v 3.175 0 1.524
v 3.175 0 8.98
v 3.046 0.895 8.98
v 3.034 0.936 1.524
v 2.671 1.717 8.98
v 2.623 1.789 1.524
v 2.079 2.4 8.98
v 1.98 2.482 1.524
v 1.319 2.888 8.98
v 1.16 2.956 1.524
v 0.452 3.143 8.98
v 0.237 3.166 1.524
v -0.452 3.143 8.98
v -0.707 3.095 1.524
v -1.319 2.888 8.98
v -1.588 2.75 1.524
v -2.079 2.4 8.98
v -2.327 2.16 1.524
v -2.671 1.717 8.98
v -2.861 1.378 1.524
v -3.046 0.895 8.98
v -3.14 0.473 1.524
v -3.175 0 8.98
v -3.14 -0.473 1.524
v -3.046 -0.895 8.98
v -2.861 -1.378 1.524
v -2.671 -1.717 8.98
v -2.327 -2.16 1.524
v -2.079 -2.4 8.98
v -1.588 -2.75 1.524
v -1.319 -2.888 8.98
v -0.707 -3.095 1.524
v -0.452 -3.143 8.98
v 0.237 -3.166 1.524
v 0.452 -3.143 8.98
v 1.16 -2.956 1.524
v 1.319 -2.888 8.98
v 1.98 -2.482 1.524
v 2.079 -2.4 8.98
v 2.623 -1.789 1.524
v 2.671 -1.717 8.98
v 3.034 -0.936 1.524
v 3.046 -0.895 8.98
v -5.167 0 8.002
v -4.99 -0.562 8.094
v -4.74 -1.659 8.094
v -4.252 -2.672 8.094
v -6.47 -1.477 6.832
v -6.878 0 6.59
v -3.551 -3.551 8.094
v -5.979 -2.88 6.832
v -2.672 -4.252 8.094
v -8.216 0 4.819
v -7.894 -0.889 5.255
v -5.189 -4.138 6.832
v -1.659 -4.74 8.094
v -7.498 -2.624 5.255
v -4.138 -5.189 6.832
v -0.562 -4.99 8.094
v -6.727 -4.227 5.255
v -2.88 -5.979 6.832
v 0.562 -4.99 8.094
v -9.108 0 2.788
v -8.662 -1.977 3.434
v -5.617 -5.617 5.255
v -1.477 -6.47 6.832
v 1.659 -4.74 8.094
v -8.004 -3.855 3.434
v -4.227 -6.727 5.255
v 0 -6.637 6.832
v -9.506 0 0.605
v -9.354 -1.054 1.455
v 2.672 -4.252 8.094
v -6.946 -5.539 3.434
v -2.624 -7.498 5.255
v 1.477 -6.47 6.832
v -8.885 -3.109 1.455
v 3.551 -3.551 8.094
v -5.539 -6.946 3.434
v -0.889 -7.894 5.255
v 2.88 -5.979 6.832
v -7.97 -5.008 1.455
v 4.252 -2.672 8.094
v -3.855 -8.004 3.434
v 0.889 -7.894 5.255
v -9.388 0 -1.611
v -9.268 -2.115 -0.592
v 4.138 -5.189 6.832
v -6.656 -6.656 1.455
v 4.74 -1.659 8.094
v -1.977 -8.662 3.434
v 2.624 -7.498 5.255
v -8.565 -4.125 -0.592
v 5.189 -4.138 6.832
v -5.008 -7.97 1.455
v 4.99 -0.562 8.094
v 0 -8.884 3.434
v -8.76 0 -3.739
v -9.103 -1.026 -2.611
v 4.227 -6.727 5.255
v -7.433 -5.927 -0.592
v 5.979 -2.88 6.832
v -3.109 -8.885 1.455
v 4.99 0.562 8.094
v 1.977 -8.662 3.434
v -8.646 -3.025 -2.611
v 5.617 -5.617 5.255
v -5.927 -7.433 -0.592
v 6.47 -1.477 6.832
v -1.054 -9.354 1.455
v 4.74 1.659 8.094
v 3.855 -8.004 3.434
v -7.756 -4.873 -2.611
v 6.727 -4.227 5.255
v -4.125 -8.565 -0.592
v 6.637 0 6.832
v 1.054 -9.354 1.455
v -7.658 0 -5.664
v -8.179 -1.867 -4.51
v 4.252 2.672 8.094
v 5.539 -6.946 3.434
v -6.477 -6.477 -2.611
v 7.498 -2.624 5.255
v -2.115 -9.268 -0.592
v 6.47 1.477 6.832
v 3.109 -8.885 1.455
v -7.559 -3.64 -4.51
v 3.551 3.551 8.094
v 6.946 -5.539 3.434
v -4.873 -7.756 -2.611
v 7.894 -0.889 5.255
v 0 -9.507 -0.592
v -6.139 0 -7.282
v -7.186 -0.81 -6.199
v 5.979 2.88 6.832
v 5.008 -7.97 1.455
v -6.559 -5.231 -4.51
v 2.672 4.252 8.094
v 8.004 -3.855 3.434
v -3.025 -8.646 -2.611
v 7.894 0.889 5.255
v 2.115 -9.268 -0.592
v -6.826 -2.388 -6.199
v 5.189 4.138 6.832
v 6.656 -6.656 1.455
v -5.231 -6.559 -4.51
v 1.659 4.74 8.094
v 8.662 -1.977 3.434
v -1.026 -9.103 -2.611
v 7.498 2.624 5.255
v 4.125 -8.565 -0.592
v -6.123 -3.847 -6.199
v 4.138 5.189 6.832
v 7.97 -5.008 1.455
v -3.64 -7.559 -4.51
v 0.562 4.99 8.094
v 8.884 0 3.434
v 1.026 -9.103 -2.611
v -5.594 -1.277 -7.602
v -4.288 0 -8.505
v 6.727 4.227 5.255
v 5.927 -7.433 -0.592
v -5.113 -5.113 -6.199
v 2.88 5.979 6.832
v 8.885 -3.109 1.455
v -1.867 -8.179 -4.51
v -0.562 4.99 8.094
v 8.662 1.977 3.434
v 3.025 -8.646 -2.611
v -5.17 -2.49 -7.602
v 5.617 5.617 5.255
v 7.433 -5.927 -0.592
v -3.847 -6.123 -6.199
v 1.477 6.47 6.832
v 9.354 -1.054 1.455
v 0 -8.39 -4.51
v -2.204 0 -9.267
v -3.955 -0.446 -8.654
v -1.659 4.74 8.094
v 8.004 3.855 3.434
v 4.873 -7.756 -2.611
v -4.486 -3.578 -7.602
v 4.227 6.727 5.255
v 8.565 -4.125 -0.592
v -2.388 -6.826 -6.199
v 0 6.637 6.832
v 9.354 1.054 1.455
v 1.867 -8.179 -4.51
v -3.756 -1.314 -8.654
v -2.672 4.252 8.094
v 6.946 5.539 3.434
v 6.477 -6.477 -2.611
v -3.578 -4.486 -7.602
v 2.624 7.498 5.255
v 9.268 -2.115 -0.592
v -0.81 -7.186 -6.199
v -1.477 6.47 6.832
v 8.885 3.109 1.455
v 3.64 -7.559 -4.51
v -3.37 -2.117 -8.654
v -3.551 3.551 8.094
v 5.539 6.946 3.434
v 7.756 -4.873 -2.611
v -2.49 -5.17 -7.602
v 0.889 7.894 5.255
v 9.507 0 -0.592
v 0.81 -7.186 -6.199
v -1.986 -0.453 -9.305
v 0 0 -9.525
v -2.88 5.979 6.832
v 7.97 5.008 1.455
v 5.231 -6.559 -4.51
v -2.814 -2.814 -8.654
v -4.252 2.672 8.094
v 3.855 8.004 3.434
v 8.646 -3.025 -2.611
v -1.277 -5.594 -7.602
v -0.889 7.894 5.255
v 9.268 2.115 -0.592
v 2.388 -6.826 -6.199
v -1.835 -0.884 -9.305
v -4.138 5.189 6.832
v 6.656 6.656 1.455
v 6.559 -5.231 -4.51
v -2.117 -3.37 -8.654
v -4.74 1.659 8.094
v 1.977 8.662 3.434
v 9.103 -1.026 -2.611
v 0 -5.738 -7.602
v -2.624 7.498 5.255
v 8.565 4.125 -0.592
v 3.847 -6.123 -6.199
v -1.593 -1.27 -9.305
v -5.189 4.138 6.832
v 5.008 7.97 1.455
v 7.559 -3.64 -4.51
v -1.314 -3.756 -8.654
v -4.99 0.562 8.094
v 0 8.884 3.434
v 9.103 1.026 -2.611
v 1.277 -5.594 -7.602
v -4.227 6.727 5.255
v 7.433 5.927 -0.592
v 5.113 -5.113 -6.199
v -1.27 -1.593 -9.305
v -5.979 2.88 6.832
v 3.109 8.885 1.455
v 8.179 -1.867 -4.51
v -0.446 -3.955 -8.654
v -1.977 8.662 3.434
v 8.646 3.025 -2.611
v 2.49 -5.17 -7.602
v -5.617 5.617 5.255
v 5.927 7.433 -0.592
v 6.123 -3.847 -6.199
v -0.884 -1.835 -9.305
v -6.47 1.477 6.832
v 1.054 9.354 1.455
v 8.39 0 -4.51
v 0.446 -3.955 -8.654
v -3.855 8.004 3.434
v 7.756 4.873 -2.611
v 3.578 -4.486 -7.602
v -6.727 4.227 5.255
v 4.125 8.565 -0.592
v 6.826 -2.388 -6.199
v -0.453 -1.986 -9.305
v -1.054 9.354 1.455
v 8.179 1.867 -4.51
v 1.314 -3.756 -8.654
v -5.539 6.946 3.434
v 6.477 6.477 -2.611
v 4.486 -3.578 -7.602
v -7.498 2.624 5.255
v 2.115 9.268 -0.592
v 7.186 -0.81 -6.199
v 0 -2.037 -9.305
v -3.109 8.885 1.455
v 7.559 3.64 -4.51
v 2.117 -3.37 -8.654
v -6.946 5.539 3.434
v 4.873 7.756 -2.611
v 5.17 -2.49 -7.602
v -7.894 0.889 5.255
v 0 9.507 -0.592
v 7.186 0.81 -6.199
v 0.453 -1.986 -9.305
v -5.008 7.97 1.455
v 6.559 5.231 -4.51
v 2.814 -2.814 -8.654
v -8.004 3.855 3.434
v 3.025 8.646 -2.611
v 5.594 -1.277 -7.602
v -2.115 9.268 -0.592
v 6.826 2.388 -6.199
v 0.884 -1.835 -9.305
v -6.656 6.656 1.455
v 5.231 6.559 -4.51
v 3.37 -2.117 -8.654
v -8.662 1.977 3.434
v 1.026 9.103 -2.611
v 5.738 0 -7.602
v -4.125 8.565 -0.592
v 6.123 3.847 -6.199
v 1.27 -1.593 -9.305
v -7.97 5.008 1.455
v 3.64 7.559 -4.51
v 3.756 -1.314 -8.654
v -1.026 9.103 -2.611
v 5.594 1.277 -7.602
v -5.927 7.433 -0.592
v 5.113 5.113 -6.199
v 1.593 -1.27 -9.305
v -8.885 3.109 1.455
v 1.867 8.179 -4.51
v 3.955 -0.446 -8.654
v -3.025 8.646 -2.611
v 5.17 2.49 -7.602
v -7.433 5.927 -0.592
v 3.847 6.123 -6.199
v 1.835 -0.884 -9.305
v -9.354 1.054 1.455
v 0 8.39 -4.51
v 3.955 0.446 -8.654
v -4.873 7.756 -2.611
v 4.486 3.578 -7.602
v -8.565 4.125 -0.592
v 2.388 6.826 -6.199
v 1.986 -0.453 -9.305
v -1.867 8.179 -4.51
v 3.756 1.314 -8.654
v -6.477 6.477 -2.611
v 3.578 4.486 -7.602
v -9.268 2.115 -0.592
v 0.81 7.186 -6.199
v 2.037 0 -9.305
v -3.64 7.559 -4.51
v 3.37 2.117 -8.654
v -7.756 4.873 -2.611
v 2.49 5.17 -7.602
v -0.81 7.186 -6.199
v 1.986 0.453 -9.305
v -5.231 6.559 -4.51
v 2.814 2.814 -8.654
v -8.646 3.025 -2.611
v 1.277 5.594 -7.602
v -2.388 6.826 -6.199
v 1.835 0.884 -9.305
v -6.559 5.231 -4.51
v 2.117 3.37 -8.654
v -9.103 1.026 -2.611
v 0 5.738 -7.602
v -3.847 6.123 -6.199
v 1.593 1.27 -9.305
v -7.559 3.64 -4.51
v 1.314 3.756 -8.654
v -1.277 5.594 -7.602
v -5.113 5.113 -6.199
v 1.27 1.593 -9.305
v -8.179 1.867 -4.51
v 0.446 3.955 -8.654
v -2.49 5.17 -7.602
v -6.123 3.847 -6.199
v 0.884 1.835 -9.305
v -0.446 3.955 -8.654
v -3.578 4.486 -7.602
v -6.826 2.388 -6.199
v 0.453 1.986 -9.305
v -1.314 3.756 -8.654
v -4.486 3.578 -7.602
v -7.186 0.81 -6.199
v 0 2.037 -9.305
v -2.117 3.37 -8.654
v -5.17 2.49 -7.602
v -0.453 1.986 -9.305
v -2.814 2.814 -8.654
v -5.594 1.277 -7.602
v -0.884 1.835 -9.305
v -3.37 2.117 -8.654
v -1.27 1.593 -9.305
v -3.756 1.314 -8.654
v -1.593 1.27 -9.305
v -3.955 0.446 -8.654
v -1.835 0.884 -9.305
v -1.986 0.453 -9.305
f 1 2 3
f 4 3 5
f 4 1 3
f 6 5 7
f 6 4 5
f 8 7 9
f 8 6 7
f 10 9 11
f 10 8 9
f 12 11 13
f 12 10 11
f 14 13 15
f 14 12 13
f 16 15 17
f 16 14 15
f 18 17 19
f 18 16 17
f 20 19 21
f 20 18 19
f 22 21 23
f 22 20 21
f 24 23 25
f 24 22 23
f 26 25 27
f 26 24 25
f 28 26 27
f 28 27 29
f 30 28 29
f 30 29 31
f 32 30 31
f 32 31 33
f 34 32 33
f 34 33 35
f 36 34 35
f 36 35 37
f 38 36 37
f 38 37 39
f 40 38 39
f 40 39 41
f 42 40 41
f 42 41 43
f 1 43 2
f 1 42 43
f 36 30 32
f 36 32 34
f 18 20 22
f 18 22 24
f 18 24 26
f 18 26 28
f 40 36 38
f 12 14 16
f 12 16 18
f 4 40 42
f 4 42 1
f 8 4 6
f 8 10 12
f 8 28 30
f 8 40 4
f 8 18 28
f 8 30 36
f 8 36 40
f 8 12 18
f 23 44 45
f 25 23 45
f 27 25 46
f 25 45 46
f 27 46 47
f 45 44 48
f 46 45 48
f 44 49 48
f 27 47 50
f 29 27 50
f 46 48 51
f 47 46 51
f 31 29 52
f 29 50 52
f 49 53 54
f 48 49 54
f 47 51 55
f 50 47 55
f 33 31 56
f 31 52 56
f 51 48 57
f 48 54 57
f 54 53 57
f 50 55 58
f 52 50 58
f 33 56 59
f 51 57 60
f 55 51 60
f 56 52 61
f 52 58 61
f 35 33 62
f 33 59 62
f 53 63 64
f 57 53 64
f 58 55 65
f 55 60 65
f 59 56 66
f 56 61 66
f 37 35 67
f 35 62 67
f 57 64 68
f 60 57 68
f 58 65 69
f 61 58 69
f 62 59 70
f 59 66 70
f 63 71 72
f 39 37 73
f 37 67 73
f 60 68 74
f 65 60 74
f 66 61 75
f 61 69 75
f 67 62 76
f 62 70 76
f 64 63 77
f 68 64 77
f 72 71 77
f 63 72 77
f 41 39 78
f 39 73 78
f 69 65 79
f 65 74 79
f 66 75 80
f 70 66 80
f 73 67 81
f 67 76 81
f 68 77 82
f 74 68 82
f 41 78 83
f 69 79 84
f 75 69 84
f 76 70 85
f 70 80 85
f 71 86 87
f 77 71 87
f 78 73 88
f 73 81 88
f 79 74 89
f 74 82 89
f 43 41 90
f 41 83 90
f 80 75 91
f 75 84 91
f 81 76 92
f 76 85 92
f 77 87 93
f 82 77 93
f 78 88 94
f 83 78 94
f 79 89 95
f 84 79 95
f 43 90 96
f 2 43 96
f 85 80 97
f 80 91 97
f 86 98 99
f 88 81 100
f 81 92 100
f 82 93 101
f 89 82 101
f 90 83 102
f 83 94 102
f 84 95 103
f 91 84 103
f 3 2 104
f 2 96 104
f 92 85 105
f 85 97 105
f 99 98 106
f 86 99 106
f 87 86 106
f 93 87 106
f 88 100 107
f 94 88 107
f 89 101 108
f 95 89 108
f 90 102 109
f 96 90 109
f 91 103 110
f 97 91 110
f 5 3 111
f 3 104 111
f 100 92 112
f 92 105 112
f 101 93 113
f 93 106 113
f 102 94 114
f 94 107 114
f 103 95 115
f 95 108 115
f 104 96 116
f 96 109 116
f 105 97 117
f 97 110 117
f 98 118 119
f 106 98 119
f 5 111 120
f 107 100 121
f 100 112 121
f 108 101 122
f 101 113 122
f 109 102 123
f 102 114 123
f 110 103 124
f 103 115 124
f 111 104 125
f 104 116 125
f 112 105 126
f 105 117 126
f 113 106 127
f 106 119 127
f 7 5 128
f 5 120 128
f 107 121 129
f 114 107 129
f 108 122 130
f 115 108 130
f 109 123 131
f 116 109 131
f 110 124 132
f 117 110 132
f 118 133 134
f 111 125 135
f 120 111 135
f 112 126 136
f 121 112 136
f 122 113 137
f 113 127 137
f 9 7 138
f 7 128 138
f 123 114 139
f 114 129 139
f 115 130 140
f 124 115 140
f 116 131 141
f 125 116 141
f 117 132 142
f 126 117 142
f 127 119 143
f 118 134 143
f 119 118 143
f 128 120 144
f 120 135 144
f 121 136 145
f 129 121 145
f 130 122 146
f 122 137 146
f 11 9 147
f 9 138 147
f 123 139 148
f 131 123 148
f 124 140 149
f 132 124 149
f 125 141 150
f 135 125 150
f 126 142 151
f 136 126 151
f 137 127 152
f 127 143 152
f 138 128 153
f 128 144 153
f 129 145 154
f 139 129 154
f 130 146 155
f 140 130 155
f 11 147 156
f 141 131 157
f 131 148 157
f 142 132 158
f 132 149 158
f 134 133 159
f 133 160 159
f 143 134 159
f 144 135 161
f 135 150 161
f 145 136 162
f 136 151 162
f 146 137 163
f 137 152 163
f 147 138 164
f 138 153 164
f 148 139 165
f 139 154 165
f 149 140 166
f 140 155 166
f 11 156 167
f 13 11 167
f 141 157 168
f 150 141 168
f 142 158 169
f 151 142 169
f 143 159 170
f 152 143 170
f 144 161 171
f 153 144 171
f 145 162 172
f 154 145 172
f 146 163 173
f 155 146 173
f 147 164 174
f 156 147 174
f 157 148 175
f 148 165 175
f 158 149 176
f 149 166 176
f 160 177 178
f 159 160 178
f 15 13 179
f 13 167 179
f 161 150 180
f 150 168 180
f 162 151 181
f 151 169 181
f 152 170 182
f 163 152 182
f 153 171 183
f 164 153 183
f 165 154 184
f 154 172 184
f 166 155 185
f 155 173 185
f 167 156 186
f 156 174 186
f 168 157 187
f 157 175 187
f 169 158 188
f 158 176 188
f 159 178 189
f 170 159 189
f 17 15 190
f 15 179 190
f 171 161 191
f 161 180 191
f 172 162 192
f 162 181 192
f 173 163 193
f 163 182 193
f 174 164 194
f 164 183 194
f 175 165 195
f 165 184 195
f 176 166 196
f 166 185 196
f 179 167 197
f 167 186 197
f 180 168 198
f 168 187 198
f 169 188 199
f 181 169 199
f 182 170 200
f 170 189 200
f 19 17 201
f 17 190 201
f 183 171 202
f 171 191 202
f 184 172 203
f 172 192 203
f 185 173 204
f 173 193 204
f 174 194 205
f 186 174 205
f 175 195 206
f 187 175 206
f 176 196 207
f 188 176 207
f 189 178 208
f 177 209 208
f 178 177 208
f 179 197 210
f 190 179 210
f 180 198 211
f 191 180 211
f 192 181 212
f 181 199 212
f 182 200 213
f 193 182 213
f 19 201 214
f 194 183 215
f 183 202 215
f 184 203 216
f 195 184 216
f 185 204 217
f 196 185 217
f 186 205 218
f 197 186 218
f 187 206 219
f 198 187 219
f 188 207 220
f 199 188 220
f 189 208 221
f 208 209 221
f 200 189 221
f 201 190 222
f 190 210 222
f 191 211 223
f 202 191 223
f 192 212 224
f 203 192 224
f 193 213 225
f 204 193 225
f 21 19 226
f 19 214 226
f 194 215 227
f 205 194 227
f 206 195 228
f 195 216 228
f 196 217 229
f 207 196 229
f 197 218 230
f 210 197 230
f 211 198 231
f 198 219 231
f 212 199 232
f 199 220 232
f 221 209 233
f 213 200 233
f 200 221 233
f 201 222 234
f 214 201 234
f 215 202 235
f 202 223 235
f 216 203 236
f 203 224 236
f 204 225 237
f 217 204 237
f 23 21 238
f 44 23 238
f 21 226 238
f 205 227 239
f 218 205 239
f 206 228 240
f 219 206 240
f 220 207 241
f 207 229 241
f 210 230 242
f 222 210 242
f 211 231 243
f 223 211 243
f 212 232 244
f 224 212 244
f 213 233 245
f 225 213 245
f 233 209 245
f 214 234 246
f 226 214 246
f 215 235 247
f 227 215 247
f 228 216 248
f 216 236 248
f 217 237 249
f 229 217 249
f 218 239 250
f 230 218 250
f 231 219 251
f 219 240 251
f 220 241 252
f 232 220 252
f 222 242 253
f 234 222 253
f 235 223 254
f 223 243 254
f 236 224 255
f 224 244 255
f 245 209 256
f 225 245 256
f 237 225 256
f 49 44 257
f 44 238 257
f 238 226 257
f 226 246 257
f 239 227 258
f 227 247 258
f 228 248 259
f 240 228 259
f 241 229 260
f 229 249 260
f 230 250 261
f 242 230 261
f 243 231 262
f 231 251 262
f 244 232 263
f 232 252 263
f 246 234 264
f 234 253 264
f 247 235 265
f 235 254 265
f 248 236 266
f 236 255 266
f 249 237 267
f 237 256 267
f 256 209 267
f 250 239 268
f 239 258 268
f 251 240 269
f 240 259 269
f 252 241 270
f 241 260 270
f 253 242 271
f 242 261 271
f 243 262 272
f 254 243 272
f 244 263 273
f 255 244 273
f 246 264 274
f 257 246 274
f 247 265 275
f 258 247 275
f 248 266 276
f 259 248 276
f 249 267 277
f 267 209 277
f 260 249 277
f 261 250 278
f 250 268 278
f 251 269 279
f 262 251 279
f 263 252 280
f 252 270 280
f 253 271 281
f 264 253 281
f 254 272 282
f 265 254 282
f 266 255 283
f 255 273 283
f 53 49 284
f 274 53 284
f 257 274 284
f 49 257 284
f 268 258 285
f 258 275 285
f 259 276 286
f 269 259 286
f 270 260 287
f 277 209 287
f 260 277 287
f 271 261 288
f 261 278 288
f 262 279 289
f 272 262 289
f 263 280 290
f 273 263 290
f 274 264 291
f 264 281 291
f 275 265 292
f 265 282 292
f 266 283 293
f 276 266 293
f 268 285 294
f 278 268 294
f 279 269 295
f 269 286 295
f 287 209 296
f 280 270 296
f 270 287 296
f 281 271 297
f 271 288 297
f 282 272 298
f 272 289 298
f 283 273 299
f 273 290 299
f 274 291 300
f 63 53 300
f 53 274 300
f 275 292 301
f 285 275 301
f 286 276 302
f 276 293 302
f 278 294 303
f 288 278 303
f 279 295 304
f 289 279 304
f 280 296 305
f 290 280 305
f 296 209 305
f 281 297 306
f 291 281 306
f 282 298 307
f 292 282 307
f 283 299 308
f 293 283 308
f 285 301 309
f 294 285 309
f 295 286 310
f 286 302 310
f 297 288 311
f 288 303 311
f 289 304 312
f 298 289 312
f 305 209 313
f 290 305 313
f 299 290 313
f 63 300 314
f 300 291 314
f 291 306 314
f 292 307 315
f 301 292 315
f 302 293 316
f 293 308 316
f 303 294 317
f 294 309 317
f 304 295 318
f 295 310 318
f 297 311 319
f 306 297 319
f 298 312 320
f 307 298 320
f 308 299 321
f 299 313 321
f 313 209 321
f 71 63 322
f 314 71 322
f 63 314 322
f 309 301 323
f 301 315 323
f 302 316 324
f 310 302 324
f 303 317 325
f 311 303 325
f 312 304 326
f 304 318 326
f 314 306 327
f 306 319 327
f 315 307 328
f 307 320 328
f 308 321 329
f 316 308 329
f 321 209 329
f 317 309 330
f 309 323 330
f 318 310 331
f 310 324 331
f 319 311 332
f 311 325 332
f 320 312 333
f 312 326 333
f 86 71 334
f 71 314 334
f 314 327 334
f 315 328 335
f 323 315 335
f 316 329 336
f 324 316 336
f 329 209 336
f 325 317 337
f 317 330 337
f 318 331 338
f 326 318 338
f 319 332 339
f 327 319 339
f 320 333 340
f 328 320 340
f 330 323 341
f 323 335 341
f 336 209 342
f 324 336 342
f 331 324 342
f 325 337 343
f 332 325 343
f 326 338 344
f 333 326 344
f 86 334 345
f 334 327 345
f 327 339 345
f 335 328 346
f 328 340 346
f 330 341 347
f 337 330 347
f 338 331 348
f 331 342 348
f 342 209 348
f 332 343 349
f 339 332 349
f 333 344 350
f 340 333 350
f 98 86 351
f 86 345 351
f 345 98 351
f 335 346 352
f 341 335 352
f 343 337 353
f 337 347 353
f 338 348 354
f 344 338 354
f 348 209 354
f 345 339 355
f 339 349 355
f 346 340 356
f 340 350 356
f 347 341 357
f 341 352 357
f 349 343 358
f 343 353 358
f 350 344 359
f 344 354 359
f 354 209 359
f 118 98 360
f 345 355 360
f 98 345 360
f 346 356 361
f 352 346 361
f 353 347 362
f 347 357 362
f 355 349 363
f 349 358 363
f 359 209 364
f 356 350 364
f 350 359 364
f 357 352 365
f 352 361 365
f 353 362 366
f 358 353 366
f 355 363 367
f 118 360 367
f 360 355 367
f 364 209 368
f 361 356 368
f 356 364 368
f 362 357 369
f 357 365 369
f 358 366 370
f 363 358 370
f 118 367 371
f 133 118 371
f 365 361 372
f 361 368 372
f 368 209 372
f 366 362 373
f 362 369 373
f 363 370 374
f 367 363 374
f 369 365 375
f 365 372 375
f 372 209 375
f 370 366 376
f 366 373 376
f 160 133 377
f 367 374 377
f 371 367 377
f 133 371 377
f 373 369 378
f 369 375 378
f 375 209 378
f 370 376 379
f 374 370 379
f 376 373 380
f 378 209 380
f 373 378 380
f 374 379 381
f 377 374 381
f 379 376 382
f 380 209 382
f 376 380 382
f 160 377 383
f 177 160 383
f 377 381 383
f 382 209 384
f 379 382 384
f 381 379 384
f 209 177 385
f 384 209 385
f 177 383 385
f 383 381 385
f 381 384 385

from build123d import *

# Parameters (mm, degrees)
F4_R     = 3.175
F5_DEPTH = 10.668
F6_DEPTH = 6.858


with BuildPart() as f2:
    # F0 (on Front) → F2 (revolve)
    with BuildSketch(Plane.XZ):
        with BuildLine():
            Line((0, -9.525), (0, 9.525))
            ThreePointArc((0, 9.525), (-9.525, 0), (0, -9.525))
        make_face()
    revolve(axis=Axis((0, 0, 0), (0, 0, 1)))

    # F4 (on offset) → F5 (cut)
    with BuildSketch(Plane.XY.offset(1.524)):
        Circle(F4_R)
    extrude(amount=F5_DEPTH, mode=Mode.SUBTRACT)

    # F4 (on offset) → F6 (cut)
    with BuildSketch(Plane.XY.offset(1.524)):
        Circle(F4_R)
    extrude(amount=F6_DEPTH, mode=Mode.SUBTRACT)


solid = f2.part
